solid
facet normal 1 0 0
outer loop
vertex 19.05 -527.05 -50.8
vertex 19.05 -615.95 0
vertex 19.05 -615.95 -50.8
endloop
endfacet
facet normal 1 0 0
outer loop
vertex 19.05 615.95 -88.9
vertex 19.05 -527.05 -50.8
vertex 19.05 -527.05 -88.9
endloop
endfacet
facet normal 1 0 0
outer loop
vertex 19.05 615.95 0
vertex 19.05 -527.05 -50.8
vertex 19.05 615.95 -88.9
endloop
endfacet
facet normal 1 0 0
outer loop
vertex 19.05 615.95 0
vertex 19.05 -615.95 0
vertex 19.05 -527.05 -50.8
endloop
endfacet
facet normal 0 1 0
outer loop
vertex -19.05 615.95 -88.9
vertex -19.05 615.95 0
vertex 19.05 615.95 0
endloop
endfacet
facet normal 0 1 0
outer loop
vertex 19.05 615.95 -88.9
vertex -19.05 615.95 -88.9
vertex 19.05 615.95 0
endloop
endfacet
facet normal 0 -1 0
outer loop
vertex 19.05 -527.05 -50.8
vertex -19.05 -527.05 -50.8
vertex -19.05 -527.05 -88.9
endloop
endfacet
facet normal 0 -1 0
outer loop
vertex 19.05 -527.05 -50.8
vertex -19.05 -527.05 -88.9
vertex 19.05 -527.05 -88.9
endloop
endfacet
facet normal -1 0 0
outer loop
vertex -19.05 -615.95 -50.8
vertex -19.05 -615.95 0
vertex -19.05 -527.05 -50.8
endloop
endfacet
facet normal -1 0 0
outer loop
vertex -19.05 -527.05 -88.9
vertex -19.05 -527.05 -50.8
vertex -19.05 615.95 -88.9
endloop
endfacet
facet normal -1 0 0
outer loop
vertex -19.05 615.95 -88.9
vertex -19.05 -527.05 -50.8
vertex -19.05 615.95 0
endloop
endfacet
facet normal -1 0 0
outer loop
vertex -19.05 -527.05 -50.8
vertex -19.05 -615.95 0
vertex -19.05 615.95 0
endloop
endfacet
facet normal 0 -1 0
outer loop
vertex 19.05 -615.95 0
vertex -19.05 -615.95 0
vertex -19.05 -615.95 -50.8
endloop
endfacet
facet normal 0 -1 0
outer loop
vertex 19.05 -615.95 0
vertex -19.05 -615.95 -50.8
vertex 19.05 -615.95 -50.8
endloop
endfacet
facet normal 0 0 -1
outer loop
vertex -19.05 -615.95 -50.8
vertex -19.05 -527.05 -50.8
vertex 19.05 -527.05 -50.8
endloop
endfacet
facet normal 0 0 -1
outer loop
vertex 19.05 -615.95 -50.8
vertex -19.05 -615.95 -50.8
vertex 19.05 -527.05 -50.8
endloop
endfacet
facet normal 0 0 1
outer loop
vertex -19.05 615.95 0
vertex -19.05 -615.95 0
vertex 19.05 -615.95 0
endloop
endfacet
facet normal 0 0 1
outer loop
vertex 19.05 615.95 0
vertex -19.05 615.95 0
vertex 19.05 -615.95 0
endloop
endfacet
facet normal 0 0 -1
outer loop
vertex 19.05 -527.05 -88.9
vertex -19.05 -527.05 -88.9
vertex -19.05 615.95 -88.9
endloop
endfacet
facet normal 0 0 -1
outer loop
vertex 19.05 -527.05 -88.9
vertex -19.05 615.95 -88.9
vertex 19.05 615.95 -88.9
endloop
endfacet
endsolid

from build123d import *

# Parameters (mm, degrees)
F0_W     = 38.1
F0_H     = 1143
F1_DEPTH = 88.9
F0_H_2   = 88.9
F2_DEPTH = 50.8


with BuildPart() as f1:
    # F0 (on Top) → F1 (new body)
    with BuildSketch(Plane.XY):
        with Locations((0, 44.45)):
            Rectangle(F0_W, F0_H)
    extrude(amount=-F1_DEPTH)

    # F0 (on Top) → F2 (join)
    with BuildSketch(Plane.XY):
        with Locations((0, -571.5)):
            Rectangle(F0_W, F0_H_2)
    extrude(amount=-F2_DEPTH)


solid = f1.part
